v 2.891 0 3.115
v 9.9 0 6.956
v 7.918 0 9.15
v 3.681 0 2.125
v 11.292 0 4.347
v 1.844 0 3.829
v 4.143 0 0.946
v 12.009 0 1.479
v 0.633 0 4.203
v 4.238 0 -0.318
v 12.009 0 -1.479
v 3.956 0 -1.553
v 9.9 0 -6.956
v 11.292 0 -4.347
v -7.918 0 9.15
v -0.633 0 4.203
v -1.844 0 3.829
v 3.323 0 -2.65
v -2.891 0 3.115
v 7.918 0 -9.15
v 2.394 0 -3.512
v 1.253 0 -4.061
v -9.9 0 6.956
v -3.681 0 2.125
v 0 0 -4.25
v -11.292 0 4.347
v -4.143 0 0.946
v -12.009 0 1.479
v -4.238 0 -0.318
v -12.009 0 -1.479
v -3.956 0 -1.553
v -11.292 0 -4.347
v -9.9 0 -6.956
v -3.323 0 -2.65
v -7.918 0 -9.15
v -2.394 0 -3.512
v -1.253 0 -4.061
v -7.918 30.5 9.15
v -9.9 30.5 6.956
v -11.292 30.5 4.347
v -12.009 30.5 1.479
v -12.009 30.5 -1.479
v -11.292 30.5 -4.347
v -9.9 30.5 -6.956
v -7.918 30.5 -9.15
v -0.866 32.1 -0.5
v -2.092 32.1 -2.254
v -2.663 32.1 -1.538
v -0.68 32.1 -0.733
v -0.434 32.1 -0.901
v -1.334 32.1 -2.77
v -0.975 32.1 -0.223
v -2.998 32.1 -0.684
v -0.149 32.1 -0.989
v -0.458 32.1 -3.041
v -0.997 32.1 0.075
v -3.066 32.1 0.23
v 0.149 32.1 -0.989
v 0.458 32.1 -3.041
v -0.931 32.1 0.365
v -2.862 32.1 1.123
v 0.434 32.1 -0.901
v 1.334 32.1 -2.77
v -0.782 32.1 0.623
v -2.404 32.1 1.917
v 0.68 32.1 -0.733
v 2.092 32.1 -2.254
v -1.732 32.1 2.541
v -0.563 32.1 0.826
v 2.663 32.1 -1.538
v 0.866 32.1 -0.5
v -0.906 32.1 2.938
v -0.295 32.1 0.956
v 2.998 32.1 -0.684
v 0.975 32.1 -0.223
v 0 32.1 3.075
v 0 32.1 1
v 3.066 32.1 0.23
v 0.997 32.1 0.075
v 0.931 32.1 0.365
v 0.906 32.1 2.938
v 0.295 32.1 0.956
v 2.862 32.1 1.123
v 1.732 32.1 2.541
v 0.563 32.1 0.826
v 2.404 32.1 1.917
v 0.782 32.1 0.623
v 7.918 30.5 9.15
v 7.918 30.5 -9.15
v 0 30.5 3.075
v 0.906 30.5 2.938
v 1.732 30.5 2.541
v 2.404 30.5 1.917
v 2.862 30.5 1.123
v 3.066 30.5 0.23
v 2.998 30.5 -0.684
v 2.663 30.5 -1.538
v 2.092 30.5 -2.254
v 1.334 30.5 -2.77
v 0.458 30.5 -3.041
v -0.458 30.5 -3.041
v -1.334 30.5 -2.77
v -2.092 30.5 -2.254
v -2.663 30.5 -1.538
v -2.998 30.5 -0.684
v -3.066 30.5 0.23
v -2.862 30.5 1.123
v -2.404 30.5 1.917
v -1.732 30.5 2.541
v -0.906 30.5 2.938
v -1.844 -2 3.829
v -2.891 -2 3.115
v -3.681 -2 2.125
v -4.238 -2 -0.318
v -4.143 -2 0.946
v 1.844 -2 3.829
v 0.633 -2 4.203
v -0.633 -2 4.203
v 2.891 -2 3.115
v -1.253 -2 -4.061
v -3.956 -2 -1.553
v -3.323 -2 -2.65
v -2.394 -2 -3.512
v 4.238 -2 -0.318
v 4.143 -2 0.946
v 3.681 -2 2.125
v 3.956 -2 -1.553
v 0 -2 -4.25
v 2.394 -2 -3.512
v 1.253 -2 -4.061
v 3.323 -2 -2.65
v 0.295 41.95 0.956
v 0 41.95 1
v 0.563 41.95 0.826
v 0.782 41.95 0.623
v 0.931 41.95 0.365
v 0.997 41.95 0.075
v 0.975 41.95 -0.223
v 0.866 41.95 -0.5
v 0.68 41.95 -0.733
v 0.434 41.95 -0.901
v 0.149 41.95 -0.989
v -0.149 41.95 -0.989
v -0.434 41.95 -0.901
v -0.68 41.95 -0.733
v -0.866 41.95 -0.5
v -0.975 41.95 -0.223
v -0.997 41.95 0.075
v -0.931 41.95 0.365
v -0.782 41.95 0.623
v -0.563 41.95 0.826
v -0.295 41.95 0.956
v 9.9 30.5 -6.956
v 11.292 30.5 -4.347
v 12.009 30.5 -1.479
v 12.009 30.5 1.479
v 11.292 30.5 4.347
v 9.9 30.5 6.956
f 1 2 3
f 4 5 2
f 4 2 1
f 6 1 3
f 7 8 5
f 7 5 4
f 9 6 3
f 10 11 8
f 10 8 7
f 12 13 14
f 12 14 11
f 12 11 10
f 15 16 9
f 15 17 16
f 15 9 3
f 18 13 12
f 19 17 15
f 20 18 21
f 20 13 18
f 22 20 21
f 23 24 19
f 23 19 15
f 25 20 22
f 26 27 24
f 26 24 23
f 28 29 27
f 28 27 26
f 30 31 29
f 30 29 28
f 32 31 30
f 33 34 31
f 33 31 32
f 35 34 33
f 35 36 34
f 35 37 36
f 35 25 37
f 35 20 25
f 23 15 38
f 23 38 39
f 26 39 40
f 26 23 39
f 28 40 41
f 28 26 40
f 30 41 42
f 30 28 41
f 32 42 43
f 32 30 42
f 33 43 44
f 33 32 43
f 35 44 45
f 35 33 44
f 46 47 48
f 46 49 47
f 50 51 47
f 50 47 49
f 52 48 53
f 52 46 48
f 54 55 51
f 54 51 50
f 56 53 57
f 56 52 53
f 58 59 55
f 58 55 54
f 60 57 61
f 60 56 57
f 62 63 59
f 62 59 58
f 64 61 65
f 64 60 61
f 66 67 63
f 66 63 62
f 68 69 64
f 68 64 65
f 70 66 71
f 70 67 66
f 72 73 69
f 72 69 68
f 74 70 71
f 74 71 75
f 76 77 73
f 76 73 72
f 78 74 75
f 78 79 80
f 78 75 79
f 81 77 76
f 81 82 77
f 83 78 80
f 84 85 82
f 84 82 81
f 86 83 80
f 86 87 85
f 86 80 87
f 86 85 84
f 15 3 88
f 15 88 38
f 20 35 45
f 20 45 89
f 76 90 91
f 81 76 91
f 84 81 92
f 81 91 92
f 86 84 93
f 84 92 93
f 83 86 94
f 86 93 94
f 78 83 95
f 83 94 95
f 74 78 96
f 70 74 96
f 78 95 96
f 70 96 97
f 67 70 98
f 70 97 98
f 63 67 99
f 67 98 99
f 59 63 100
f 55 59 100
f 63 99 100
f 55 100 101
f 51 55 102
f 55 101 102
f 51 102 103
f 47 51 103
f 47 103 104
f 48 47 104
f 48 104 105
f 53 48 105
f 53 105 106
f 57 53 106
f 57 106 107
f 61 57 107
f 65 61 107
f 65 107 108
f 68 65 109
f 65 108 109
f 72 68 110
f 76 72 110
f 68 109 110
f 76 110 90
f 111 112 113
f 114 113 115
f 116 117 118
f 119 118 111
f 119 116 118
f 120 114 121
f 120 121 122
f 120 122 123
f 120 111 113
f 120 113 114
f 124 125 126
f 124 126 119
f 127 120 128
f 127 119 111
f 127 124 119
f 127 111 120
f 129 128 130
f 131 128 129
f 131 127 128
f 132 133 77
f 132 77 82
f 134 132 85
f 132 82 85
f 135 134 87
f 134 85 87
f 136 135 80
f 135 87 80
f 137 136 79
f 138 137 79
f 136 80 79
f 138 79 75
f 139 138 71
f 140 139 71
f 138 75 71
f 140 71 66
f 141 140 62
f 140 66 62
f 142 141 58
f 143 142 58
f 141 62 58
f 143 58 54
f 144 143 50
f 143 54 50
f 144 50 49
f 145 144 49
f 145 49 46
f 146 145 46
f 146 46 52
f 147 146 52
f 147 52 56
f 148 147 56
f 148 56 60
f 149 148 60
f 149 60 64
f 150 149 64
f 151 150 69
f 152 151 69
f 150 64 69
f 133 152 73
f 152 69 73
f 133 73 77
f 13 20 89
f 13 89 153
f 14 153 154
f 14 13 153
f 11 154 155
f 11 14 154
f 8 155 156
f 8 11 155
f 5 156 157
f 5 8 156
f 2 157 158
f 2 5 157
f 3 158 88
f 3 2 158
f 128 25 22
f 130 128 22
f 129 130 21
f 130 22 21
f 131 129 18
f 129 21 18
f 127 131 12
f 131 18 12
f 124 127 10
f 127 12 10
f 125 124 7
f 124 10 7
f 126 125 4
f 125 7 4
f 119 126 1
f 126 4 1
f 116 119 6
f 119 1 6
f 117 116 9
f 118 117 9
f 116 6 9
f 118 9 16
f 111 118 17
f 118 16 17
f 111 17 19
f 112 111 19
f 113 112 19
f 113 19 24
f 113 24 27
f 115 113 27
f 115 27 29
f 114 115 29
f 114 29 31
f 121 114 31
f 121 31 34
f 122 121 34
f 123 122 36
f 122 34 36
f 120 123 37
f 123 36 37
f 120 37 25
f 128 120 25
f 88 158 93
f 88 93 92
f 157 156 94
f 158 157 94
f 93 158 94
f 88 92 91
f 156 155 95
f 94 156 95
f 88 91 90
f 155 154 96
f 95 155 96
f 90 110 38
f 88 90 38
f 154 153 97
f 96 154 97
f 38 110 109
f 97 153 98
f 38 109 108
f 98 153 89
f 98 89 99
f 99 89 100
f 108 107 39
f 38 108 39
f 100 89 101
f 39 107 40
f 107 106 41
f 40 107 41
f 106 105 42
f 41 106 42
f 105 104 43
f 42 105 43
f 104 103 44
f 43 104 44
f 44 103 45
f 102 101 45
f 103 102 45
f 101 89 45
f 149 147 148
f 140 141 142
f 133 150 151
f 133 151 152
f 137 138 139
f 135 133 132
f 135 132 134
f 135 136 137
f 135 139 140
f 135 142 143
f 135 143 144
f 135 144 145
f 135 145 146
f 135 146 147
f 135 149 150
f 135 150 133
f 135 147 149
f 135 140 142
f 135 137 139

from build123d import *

# Parameters (mm, degrees)
BOSS_EXTRUDE1_DEPTH = 30.5
SKETCH3_R           = 3.075
BOSS_EXTRUDE2_DEPTH = 1.6
SKETCH4_R           = 1
BOSS_EXTRUDE3_DEPTH = 9.85
SKETCH5_R           = 4.25
BOSS_EXTRUDE4_DEPTH = 2


with BuildPart() as part:
    # Sketch2 → Boss-Extrude1 (new body)
    with BuildSketch(Plane(origin=(0, 0, 0), x_dir=(1, 0, 0), z_dir=(0, 1, 0))):
        with BuildLine():
            Line((-7.917543811, 9.15), (7.917543811, 9.15))
            ThreePointArc((7.917543811, 9.15), (12.1, 0), (7.917543811, -9.15))
            Line((7.917543811, -9.15), (-7.917543811, -9.15))
            ThreePointArc((-7.917543811, -9.15), (-12.1, 0), (-7.917543811, 9.15))
        make_face()
    extrude(amount=BOSS_EXTRUDE1_DEPTH)

    # Sketch3 → Boss-Extrude2 (add)
    with BuildSketch(Plane(origin=(0, 30.5, 0), x_dir=(1, 0, 0), z_dir=(0, 1, 0))):
        with Locations(Location((0, 0, 0), (0, 0, 270))):
            Circle(SKETCH3_R)
    extrude(amount=BOSS_EXTRUDE2_DEPTH)

    # Sketch4 → Boss-Extrude3 (add)
    with BuildSketch(Plane(origin=(0, 32.1, 0), x_dir=(1, 0, 0), z_dir=(0, 1, 0))):
        with Locations(Location((0, 0, 0), (0, 0, 270))):
            Circle(SKETCH4_R)
    extrude(amount=BOSS_EXTRUDE3_DEPTH)

    # Sketch5 → Boss-Extrude4 (add)
    with BuildSketch(Plane.XZ):
        with Locations(Location((0, 0, 0), (0, 0, 270))):
            Circle(SKETCH5_R)
    extrude(amount=BOSS_EXTRUDE4_DEPTH)


solid = part.part
